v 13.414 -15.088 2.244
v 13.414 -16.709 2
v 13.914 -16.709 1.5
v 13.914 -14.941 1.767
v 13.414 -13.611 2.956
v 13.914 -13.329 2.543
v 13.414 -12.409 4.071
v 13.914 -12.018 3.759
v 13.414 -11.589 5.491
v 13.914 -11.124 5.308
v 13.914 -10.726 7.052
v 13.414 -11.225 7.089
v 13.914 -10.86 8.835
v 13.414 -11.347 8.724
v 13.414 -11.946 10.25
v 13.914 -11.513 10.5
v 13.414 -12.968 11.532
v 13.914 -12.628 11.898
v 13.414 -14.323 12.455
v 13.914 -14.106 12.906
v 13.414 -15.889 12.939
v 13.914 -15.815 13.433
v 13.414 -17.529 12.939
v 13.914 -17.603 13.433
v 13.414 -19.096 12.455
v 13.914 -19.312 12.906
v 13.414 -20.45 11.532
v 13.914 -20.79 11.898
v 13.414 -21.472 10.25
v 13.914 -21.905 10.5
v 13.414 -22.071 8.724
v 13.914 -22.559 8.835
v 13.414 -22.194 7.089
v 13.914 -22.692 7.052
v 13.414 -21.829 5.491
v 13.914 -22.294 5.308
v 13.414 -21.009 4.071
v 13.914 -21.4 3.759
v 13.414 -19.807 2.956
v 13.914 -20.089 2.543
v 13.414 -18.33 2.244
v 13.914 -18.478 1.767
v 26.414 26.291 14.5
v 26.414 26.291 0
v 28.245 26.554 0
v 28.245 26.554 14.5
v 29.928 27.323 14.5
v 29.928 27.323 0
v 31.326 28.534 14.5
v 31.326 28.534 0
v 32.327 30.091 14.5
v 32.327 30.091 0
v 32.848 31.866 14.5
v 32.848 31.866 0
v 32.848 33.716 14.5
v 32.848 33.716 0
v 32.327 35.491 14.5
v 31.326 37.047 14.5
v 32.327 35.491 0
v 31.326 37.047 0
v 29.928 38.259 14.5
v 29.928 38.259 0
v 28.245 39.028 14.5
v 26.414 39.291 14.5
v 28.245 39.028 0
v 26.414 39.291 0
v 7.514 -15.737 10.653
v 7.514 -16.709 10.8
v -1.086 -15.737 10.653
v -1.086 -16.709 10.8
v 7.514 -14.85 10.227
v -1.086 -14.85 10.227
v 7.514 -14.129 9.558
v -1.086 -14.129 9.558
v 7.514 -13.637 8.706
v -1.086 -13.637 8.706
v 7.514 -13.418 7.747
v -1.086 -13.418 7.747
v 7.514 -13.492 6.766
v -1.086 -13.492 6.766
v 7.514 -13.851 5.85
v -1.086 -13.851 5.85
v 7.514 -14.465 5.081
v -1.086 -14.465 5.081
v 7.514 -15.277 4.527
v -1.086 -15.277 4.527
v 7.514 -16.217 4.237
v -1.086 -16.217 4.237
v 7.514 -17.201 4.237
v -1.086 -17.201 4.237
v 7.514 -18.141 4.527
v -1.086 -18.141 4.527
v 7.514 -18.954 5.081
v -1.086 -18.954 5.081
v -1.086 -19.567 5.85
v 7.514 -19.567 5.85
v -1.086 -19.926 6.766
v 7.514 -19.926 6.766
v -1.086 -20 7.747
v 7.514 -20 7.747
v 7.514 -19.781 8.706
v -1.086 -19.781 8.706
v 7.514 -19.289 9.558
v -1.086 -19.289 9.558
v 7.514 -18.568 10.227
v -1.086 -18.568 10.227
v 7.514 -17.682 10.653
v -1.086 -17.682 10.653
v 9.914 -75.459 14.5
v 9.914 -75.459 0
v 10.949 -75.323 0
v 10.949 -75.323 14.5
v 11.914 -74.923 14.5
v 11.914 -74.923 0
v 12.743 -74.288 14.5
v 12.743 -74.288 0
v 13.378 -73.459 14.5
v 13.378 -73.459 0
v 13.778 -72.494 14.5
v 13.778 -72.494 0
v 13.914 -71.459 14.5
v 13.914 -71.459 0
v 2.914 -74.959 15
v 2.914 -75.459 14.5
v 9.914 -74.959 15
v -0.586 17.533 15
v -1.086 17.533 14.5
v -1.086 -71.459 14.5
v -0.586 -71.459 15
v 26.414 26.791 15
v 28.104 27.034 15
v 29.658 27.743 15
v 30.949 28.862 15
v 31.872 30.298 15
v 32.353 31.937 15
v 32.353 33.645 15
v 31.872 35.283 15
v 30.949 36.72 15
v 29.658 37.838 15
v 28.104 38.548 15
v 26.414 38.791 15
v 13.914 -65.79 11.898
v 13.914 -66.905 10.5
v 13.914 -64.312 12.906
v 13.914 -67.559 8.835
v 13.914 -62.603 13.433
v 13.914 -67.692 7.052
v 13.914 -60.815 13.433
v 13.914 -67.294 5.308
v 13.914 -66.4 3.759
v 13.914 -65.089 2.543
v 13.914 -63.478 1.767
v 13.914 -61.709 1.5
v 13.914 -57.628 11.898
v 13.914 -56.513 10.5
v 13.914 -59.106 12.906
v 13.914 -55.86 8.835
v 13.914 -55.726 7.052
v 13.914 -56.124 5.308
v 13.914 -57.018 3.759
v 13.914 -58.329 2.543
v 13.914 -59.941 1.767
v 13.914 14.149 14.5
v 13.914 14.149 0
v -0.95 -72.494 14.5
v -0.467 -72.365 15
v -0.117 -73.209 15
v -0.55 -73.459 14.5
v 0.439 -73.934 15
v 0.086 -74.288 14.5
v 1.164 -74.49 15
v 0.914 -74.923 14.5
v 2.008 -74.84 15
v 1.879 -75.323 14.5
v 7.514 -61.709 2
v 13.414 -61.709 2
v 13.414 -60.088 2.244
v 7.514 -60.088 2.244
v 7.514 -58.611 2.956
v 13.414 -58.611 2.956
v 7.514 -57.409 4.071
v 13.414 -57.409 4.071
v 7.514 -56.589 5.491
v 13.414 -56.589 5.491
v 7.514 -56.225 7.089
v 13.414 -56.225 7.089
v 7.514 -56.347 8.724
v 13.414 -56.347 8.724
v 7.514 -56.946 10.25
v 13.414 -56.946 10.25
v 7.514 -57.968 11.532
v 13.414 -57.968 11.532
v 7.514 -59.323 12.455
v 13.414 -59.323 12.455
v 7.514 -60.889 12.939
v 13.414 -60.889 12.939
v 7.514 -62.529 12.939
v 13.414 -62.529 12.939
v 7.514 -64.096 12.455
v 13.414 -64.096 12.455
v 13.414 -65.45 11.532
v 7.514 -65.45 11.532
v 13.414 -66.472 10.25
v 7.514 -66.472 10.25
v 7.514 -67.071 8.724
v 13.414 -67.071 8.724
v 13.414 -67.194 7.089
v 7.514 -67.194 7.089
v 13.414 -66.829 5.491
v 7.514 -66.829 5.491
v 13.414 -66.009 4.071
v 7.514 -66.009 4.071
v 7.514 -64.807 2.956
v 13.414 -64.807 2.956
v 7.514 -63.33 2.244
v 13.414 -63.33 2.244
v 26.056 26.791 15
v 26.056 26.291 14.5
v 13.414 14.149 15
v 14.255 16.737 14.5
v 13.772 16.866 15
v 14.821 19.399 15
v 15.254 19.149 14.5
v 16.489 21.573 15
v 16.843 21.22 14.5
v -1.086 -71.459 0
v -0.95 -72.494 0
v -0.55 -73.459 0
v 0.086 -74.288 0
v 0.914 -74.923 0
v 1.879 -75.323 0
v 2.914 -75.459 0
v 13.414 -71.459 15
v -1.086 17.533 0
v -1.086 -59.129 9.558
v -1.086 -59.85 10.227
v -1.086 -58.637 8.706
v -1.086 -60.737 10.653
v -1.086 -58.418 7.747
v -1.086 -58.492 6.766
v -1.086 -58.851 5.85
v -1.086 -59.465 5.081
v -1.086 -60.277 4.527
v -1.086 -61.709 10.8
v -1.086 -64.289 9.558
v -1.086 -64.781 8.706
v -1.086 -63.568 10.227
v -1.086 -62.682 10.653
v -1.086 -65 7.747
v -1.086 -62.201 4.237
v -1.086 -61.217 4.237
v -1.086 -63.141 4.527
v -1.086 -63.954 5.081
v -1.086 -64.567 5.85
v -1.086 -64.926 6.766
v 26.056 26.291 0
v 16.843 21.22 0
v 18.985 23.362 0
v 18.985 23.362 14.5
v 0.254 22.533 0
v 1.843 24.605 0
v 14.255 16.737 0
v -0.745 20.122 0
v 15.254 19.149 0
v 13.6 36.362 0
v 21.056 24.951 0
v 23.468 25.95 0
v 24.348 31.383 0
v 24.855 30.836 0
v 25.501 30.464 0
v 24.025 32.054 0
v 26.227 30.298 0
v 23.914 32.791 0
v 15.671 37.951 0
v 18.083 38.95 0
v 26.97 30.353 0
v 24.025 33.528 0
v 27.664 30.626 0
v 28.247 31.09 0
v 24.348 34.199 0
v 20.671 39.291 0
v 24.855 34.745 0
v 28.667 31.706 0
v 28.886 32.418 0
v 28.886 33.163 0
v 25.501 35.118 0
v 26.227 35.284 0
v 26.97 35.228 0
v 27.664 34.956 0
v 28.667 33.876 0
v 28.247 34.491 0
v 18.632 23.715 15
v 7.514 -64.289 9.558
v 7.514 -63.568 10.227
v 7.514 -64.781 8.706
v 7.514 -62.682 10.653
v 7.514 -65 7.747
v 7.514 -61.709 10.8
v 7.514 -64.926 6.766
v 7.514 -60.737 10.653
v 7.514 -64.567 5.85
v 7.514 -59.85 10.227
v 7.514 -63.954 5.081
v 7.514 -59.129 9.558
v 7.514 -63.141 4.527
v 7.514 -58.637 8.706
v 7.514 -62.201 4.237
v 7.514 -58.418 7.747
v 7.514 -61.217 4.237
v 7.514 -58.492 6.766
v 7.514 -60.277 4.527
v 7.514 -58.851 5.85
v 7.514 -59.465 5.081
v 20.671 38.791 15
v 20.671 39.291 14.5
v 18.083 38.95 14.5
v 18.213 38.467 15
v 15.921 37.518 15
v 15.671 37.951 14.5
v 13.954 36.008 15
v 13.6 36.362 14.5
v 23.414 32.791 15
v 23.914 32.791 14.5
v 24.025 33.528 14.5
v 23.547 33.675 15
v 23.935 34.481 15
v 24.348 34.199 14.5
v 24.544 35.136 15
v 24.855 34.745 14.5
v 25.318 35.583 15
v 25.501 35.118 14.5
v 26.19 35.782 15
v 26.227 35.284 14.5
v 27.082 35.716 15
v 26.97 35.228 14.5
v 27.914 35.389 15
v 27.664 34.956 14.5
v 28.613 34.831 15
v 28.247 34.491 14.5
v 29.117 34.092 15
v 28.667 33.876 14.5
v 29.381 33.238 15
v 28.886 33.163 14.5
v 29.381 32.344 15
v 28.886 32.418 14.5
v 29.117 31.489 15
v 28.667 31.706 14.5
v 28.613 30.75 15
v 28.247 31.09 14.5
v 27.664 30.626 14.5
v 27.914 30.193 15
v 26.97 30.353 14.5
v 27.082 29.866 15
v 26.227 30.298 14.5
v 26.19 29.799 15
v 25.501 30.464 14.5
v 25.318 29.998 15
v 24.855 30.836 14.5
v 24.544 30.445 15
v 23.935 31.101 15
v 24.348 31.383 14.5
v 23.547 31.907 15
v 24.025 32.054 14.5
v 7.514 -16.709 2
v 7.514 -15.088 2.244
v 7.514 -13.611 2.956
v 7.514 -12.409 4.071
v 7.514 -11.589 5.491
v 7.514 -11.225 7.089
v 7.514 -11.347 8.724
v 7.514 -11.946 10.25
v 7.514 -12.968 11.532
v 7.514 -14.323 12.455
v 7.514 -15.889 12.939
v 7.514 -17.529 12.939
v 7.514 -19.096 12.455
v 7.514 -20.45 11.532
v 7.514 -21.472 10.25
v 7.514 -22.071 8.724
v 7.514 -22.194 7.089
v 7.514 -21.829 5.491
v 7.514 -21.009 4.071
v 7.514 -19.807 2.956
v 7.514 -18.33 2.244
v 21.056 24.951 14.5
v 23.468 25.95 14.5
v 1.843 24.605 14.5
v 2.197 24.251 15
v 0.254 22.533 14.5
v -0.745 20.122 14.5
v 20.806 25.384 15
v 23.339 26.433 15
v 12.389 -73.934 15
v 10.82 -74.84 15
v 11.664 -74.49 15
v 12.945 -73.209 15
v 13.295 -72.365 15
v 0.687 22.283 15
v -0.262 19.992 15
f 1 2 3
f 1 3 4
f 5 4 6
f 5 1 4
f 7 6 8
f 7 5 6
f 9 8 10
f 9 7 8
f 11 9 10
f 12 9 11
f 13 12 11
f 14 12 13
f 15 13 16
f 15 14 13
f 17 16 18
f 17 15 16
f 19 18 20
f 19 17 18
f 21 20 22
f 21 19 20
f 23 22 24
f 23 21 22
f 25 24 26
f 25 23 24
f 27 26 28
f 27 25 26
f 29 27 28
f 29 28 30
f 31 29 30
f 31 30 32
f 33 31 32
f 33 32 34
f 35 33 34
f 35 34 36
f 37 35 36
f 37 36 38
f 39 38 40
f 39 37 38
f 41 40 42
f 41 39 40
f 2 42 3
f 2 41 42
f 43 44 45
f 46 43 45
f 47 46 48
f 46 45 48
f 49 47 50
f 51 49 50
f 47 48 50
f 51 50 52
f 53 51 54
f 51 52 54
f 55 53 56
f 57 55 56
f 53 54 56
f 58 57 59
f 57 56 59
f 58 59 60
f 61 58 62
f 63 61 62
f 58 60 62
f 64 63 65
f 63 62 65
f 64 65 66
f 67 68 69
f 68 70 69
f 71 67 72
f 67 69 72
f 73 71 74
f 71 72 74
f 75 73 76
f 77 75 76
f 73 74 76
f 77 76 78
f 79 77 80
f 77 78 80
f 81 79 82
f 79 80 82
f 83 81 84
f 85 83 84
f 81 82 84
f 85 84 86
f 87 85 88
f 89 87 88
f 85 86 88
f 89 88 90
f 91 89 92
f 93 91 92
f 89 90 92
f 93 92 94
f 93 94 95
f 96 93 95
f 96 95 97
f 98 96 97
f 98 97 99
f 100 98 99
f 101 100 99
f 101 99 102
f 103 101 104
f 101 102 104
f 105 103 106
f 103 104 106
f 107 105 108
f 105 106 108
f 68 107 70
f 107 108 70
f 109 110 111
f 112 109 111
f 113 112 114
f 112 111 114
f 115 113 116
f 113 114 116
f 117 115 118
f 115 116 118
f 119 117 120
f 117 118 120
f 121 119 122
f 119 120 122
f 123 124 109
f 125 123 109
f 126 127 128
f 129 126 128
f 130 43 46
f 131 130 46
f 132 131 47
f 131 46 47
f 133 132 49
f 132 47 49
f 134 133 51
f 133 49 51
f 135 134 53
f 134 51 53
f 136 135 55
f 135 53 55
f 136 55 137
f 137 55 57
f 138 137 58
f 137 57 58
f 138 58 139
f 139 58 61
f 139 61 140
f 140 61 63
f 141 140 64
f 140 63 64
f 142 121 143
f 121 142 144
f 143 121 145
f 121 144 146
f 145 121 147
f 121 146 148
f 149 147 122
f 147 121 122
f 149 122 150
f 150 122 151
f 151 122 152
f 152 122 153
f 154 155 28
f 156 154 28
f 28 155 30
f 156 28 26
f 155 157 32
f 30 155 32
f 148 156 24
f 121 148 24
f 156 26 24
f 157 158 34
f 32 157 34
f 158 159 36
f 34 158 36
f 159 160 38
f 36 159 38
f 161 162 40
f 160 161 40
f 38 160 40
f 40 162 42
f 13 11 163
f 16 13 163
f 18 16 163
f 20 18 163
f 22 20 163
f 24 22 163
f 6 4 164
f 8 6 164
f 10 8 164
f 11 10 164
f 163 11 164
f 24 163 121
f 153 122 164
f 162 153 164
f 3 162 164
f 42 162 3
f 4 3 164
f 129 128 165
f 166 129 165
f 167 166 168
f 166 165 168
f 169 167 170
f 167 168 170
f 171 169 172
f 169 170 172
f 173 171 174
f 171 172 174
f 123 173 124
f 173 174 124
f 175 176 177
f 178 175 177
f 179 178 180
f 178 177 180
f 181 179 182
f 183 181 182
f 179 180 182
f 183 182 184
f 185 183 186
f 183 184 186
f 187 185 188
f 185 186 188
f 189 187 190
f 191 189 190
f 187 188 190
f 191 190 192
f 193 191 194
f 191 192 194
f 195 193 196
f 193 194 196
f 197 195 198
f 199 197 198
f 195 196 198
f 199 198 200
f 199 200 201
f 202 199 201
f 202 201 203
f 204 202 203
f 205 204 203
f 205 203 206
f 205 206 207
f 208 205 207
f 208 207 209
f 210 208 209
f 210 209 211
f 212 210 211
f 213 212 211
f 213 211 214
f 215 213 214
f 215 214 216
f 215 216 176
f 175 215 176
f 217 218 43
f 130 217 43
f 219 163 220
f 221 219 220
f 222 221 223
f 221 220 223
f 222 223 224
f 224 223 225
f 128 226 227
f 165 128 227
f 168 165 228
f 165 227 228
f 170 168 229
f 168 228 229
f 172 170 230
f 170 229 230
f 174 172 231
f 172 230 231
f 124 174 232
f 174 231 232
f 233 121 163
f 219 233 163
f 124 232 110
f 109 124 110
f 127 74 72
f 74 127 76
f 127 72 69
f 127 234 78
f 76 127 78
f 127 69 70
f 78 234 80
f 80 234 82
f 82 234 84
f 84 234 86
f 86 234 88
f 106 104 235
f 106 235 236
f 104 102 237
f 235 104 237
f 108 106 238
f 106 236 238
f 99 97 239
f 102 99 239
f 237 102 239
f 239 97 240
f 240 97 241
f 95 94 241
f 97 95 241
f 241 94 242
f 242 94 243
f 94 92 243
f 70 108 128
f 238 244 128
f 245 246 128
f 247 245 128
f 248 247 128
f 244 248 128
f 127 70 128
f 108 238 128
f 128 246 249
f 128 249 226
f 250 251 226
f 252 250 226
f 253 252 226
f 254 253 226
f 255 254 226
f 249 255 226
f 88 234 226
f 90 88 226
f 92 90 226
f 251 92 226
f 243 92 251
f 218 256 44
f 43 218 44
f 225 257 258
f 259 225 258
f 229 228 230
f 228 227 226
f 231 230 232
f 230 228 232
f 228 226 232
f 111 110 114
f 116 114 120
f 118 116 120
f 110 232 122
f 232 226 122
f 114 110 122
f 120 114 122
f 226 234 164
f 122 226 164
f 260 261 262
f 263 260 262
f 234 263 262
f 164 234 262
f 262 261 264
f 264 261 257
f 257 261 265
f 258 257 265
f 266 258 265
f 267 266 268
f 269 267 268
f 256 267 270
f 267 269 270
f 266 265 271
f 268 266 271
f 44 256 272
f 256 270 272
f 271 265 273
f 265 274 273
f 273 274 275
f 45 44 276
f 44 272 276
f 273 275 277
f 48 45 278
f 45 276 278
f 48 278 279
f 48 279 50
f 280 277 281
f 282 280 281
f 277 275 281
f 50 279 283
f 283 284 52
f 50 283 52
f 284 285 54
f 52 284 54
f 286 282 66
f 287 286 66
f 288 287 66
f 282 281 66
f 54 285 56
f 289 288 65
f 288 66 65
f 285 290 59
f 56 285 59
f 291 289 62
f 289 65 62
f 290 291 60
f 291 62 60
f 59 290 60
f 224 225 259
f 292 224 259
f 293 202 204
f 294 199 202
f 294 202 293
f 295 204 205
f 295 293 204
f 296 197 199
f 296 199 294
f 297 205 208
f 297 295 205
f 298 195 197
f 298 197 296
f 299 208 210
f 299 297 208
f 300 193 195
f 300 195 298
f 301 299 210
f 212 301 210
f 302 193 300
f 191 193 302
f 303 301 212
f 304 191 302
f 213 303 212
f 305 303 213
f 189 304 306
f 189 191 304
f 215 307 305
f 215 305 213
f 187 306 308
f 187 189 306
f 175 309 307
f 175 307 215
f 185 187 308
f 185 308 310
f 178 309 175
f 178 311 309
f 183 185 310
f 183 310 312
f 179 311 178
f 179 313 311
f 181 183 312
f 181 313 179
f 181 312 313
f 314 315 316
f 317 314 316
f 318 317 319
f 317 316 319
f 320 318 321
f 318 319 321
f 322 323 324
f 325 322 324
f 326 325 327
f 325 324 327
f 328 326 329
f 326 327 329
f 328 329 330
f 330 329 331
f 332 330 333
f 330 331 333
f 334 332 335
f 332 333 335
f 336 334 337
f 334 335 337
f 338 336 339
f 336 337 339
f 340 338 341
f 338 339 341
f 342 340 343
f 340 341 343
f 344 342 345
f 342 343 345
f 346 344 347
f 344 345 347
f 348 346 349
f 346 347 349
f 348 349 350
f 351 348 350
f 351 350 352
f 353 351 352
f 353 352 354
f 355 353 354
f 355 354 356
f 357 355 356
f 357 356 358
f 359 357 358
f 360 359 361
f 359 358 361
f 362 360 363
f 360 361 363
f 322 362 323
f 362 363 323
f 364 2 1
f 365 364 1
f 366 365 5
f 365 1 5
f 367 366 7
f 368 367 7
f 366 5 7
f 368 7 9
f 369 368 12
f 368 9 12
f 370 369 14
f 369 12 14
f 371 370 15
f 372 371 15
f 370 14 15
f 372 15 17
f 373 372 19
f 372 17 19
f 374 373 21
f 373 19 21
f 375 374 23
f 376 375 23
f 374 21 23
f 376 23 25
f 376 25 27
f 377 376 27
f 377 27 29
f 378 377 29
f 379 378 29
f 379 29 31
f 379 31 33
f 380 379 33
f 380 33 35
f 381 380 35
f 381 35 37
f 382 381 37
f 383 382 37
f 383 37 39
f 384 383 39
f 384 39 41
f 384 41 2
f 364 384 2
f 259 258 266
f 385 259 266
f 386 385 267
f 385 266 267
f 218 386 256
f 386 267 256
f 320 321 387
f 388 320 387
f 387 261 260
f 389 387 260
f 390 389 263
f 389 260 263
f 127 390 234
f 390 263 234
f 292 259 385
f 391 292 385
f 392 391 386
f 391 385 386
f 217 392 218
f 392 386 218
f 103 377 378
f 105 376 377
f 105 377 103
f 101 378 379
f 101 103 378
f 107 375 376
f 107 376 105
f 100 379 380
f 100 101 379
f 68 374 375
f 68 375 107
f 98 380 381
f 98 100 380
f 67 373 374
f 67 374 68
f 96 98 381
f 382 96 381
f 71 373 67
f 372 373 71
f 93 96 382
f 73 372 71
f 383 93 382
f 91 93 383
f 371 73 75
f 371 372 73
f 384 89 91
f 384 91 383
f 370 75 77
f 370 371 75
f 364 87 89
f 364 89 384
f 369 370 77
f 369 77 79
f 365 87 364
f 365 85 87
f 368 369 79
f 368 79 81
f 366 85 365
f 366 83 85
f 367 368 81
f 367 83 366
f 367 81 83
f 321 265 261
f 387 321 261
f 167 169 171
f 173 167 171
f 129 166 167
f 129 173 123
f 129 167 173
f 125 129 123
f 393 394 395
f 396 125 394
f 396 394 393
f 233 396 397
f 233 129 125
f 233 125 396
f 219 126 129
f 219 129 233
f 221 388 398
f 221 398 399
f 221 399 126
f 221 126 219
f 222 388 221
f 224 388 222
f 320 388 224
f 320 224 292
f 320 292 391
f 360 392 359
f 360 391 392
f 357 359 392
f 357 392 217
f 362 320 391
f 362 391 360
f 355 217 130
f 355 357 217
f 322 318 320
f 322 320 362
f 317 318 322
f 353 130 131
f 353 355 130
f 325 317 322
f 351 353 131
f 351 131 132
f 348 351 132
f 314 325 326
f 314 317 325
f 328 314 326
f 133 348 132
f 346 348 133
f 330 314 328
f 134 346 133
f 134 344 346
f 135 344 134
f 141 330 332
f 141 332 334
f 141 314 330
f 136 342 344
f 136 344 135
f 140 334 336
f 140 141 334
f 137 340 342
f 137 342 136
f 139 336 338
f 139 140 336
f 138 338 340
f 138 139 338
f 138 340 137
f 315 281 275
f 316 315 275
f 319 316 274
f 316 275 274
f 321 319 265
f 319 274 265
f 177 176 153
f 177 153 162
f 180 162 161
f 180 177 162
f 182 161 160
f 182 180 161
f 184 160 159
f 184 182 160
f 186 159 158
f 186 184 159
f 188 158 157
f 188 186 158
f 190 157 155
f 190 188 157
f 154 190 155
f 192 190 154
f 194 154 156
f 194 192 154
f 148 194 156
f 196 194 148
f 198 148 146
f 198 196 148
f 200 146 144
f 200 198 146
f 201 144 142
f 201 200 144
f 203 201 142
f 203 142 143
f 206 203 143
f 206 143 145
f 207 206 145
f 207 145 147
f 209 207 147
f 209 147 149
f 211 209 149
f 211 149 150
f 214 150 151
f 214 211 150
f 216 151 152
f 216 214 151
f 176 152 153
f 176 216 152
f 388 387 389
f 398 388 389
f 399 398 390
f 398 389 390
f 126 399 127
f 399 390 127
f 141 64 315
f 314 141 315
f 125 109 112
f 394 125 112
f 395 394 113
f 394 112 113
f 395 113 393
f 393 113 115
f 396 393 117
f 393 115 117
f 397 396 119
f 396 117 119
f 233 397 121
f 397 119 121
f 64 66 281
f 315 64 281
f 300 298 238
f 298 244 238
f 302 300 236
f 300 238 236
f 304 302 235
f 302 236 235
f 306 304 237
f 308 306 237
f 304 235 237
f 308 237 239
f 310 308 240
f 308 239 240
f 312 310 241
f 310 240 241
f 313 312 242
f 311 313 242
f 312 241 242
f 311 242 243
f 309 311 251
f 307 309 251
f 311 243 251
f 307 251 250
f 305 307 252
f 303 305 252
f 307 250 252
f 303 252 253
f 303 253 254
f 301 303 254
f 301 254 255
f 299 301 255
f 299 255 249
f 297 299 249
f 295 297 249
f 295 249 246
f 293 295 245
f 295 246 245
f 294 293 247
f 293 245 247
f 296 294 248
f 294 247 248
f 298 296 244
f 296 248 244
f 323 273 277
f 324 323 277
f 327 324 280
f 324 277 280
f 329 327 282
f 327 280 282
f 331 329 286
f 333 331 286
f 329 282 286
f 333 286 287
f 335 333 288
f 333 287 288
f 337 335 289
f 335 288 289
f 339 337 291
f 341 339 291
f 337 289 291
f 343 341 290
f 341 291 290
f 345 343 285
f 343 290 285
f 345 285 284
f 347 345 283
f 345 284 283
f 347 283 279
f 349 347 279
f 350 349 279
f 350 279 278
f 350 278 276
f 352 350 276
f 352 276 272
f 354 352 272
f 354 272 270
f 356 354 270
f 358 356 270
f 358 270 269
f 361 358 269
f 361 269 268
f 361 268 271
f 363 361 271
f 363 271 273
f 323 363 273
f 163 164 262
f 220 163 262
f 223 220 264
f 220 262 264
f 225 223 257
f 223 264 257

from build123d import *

# Parameters (mm, degrees)
BOSS_EXTRUDE1_DEPTH                                 = 15
TAP_DRILL_FOR_M6_TAP1_D                             = 5
CBORE_FOR_M6_HEX_SOCKET_HEAD_CAP_SCREW1_D           = 6.6
CBORE_FOR_M6_HEX_SOCKET_HEAD_CAP_SCREW1_CBORE_D     = 11
CBORE_FOR_M6_HEX_SOCKET_HEAD_CAP_SCREW1_CBORE_DEPTH = 6.4
CHAMFER1_SIZE                                       = 0.5


with BuildPart() as part:
    # Sketch1 → Boss-Extrude1 (new body)
    with BuildSketch(Plane.XY):
        with BuildLine():
            Line((2.914096072, -75.45920495), (9.914096072, -75.45920495))
            ThreePointArc((9.914096072, -75.45920495), (12.742523197, -74.287632074), (13.914096072, -71.45920495))
            Line((13.914096072, -71.45920495), (13.914096072, 14.148669163))
            ThreePointArc((13.914096072, 14.148669163), (14.675300747, 17.975503486), (16.84302826, 21.219736974))
            Line((16.84302826, 21.219736974), (18.985163884, 23.361872598))
            ThreePointArc((18.985163884, 23.361872598), (22.229397372, 25.529600111), (26.056231696, 26.290804786))
            Line((26.056231696, 26.290804786), (26.414096072, 26.290804786))
            ThreePointArc((26.414096072, 26.290804786), (32.914096072, 32.790804786), (26.414096072, 39.290804786))
            Line((26.414096072, 39.290804786), (20.671455385, 39.290804786))
            ThreePointArc((20.671455385, 39.290804786), (16.844621061, 38.529600111), (13.600387573, 36.361872598))
            Line((13.600387573, 36.361872598), (1.84302826, 24.604513285))
            ThreePointArc((1.84302826, 24.604513285), (-0.324699253, 21.360279797), (-1.085903928, 17.533445473))
            Line((-1.085903928, 17.533445473), (-1.085903928, -71.45920495))
            ThreePointArc((-1.085903928, -71.45920495), (0.085668947, -74.287632074), (2.914096072, -75.45920495))
        make_face()
    extrude(amount=BOSS_EXTRUDE1_DEPTH)

    # Tap Drill for M6 Tap1 (through all)
    with Locations(Plane.XY.offset(15)):
        with Locations((26.414096072, 32.790804786)):
            Hole(TAP_DRILL_FOR_M6_TAP1_D / 2)

    # CBORE for M6 Hex Socket Head Cap Screw1 (through all)
    with Locations(Plane(origin=(13.914096072, 0, 0), x_dir=(0, 0, -1), z_dir=(1, 0, 0))):
        with Locations((-7.5, -16.709195214), (-7.5, -61.709195214)):
            CounterBoreHole(CBORE_FOR_M6_HEX_SOCKET_HEAD_CAP_SCREW1_D / 2, CBORE_FOR_M6_HEX_SOCKET_HEAD_CAP_SCREW1_CBORE_D / 2, CBORE_FOR_M6_HEX_SOCKET_HEAD_CAP_SCREW1_CBORE_DEPTH)

    # Chamfer1
    chamfer1_edges = [part.edges().sort_by_distance(p)[0] for p in [
        (16.844621061, 38.529600111, 15),
        (7.721707916, 30.483192942, 15),
        (-0.324699253, 21.360279797, 15),
        (-1.085903928, -26.962879738, 15),
        (0.085668947, -74.287632074, 15),
        (6.414096072, -75.45920495, 15),
        (12.742523197, -74.287632074, 15),
        (13.914096072, -28.655267893, 15),
        (14.675300747, 17.975503486, 15),
        (17.914096072, 22.290804786, 15),
        (32.914096072, 32.790804786, 15),
        (22.229397372, 25.529600111, 15),
        (28.914096072, 32.790804786, 15),
        (26.235163884, 26.290804786, 15),
        (13.914096072, -61.709195214, 13),
        (13.914096072, -16.709195214, 13),
        (23.542775728, 39.290804786, 15),
    ]]
    chamfer(chamfer1_edges, length=CHAMFER1_SIZE)


solid = part.part
